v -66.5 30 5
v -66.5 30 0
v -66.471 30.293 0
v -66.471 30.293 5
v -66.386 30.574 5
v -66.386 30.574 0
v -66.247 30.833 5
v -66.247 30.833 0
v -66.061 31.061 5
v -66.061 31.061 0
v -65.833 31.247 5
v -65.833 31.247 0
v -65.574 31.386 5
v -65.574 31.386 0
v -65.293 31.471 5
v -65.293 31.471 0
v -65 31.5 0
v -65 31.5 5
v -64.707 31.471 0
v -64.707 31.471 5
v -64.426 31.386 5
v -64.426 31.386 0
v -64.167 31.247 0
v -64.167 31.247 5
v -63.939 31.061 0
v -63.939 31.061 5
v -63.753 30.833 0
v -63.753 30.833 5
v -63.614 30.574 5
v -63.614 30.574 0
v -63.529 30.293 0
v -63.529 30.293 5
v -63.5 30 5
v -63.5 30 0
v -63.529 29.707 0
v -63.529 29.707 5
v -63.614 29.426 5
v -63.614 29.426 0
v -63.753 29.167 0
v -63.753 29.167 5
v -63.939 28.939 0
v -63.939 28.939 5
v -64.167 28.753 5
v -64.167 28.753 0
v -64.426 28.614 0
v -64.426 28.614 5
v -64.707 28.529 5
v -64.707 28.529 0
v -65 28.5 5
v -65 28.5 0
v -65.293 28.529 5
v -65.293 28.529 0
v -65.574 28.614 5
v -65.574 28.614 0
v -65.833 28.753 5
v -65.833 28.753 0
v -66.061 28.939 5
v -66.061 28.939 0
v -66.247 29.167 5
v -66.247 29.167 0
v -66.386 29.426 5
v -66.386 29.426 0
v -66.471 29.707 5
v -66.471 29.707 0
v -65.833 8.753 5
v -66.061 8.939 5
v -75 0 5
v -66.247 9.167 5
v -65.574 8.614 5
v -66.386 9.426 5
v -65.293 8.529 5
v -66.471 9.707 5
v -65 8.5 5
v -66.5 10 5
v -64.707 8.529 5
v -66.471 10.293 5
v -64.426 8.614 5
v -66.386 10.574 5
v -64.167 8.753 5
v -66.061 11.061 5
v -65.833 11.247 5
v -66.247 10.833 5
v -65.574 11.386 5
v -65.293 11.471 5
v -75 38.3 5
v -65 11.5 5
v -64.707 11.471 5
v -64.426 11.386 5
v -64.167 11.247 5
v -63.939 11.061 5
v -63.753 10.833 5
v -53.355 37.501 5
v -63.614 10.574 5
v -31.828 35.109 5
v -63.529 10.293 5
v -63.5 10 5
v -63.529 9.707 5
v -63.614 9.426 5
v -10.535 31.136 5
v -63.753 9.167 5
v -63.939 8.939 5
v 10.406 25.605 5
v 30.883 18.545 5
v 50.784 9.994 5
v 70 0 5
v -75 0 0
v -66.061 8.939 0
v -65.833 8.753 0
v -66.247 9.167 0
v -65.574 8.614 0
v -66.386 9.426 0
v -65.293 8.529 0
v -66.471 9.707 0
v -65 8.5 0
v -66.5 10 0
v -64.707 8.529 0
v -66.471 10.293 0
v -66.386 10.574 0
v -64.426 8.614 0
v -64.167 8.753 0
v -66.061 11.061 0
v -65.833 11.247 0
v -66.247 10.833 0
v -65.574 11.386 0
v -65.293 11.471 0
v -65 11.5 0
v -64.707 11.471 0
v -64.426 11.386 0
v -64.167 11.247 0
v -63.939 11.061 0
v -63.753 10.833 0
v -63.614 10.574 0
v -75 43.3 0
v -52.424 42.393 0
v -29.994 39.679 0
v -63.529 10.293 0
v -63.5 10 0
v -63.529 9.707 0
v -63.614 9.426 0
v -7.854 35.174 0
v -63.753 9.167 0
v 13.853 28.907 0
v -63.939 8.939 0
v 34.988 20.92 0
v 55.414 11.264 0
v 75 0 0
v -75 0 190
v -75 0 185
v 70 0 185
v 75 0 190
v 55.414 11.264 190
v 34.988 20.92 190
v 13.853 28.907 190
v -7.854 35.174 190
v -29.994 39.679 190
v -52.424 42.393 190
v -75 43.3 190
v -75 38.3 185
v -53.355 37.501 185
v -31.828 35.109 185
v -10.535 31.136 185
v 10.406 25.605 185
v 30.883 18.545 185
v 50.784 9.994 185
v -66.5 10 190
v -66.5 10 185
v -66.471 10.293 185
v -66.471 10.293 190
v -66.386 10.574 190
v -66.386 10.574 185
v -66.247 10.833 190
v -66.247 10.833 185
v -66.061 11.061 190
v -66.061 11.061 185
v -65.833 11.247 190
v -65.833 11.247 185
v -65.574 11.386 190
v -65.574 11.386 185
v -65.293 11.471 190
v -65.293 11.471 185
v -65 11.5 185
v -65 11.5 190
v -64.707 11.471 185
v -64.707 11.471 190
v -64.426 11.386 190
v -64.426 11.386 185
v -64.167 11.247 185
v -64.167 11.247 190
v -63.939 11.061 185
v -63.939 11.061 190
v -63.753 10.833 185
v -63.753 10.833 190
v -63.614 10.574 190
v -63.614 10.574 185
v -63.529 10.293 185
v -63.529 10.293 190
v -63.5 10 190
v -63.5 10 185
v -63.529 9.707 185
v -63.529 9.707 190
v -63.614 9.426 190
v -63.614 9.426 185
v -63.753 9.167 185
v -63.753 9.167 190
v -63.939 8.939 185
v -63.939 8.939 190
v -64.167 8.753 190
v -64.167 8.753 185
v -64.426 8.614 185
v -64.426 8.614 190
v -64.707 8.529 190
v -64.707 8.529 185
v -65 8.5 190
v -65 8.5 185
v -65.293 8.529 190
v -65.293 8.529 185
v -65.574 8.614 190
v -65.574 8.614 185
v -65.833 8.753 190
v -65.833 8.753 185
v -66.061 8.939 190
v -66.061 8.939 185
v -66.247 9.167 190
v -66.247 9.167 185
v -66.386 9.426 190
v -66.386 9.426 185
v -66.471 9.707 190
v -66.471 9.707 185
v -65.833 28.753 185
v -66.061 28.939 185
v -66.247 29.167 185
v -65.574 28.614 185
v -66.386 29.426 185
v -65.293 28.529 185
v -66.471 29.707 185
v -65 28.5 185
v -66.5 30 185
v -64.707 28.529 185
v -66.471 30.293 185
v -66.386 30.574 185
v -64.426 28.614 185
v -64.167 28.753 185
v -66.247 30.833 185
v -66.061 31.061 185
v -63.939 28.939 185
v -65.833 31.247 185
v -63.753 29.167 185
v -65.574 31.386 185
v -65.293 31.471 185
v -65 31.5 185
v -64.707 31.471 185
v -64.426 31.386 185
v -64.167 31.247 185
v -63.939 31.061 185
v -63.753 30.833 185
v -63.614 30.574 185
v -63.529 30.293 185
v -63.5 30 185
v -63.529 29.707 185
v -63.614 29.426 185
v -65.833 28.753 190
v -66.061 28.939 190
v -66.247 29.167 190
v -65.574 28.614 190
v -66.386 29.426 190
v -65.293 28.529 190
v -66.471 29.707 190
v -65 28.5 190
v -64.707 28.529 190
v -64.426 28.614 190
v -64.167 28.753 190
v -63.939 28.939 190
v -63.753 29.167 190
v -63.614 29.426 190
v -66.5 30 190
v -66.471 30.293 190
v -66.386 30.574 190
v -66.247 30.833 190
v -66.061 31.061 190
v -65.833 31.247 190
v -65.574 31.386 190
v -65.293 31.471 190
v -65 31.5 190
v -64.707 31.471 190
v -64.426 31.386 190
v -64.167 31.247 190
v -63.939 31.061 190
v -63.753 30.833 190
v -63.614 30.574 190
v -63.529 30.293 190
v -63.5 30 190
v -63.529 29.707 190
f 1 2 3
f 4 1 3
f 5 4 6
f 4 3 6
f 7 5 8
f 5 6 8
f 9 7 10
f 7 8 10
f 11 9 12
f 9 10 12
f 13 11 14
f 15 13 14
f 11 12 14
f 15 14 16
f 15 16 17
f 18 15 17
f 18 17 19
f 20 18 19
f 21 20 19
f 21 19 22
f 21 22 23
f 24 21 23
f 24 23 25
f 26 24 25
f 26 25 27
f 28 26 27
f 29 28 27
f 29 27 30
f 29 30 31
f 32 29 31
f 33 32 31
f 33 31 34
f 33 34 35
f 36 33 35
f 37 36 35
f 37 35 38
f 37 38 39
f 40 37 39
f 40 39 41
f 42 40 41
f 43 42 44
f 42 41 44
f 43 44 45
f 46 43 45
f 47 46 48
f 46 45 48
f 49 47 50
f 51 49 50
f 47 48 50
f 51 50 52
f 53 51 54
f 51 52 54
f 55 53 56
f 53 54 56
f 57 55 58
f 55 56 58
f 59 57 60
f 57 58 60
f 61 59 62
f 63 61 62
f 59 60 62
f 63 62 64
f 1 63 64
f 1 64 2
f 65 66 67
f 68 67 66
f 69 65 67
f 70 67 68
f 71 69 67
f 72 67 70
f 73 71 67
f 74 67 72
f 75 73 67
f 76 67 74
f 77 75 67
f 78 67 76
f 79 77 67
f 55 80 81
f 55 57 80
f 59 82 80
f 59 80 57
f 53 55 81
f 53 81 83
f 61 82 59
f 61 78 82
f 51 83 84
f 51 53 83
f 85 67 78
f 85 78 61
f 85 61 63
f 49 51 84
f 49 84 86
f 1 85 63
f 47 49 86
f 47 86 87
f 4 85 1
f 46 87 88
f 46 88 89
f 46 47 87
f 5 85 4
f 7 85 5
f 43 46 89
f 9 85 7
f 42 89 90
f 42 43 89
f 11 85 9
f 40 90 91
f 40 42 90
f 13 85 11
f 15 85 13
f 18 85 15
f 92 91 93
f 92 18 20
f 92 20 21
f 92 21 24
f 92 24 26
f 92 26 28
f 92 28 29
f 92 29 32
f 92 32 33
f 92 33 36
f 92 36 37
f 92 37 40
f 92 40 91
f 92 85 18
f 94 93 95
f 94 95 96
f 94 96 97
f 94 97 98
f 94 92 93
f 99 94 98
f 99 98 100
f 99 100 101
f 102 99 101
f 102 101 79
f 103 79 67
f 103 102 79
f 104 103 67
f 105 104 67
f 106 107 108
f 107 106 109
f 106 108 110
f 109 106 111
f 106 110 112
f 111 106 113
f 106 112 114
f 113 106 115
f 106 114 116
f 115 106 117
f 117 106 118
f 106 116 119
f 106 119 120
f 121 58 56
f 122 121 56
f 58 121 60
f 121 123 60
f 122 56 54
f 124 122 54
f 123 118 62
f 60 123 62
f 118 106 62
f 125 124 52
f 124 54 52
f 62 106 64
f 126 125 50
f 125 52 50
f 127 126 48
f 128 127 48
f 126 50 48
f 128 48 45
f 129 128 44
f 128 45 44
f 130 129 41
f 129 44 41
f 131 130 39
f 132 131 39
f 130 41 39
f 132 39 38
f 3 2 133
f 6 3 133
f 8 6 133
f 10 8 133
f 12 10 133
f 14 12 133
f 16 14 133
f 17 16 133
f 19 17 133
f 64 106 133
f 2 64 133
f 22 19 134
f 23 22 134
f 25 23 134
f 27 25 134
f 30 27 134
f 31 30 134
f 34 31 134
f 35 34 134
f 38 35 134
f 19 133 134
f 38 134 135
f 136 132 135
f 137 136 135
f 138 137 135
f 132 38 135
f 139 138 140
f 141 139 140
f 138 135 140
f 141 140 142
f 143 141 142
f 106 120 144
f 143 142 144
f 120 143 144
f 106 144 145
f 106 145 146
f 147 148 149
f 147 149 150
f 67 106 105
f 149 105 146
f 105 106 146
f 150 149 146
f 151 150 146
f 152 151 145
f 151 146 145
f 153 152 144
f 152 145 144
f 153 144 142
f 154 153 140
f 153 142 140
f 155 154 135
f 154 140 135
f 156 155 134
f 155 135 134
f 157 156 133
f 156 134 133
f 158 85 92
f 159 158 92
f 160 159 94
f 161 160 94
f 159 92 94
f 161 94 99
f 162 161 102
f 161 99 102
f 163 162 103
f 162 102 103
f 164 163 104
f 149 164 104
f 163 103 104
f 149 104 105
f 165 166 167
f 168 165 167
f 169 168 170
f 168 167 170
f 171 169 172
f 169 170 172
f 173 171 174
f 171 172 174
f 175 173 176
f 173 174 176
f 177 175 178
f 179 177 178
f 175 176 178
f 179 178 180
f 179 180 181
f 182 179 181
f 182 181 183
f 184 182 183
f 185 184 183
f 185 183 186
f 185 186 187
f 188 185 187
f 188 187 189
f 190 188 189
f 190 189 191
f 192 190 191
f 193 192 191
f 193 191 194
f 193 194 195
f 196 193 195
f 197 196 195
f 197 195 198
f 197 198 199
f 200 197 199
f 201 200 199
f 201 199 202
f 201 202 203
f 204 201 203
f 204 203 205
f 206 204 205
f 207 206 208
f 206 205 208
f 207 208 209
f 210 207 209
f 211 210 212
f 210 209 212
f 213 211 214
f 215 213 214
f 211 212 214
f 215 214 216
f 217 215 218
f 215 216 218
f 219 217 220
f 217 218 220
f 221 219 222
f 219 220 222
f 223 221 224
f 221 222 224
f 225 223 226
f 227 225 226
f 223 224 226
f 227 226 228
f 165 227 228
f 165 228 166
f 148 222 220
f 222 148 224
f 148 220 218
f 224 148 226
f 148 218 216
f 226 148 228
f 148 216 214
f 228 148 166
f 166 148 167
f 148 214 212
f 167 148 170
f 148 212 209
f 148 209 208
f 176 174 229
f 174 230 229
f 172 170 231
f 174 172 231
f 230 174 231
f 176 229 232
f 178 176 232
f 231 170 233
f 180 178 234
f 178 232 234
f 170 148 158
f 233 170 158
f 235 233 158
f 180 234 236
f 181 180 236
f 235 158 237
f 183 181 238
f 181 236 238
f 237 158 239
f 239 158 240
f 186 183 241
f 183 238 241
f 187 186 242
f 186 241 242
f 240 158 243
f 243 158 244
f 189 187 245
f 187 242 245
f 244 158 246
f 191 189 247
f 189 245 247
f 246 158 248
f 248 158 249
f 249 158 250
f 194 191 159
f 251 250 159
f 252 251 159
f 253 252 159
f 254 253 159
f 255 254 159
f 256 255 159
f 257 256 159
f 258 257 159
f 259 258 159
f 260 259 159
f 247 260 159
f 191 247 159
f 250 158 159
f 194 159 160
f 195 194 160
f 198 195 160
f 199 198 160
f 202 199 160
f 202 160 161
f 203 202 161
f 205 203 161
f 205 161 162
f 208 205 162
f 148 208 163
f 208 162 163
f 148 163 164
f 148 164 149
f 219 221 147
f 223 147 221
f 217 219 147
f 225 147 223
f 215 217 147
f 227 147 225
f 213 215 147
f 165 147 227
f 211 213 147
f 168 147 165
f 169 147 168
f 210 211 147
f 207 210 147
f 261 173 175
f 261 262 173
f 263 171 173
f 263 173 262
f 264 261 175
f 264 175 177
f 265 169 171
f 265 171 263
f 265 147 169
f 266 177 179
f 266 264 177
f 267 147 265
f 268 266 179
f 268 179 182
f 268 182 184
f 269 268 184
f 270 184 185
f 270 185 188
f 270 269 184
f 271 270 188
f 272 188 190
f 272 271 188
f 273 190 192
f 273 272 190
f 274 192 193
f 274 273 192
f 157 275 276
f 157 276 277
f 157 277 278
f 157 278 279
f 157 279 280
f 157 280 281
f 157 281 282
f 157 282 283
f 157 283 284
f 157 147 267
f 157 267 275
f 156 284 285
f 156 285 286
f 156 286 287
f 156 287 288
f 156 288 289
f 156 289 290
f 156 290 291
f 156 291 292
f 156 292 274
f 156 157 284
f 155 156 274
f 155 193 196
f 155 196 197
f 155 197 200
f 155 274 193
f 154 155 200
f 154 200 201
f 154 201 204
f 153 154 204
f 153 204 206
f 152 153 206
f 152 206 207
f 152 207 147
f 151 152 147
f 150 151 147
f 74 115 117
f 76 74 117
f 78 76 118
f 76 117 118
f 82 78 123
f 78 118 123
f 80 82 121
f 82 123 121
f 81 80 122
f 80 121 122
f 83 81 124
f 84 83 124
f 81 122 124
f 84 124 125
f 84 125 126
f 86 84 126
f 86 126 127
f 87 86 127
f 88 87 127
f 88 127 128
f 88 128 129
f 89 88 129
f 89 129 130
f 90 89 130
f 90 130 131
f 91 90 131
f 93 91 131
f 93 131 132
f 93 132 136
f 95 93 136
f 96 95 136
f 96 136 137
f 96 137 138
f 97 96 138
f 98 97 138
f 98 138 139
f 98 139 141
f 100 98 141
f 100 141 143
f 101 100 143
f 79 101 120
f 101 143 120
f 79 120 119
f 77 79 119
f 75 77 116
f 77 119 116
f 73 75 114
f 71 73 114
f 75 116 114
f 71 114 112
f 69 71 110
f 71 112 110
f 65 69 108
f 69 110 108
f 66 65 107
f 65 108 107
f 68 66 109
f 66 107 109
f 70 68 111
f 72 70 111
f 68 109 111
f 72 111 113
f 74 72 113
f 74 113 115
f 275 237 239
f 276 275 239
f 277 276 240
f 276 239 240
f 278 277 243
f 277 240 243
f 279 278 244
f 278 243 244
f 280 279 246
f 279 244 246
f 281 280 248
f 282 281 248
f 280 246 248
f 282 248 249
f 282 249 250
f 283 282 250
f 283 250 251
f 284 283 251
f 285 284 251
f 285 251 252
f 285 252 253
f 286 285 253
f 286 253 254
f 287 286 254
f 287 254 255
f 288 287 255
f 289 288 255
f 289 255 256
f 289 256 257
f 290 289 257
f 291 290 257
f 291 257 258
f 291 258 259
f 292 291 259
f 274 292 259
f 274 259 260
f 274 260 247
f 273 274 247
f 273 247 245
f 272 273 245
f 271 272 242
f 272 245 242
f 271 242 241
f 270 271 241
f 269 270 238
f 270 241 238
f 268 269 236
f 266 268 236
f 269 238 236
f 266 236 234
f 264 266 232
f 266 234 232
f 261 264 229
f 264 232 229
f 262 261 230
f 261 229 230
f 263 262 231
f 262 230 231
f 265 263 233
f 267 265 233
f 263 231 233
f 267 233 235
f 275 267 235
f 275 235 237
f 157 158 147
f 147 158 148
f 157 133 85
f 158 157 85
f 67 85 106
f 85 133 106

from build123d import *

# Parameters (mm, degrees)
F1_DEPTH = 5
F3_DEPTH = 180
F5_DEPTH = 5
F7_D     = 3
F7_DEPTH = 200
F7_TIP   = 0.9012909285


with BuildPart() as f1:
    # F0 (on Top) → F1 (new body)
    with BuildSketch(Plane.XY):
        with BuildLine():
            Line((-75, 0), (0, 0))
            Line((0, 0), (75, 0))
            ThreePointArc((75, 0), (3.0622988388, 32.2584255386), (-75, 43.3))
            Line((-75, 43.3), (-75, 0))
        make_face()
    extrude(amount=F1_DEPTH)

    # F2 (on face) → F3 (join)
    with BuildSketch(Plane.XY.offset(5)):
        with BuildLine():
            ThreePointArc((75, 0), (3.0622988388, 32.2584255386), (-75, 43.3))
            Line((-75, 43.3), (-75, 38.3))
            ThreePointArc((-75, 38.3), (-0.0135178849, 28.5635745872), (70, 0))
            Line((70, 0), (75, 0))
        make_face()
    extrude(amount=F3_DEPTH)

    # F4 (on face) → F5 (join)
    with BuildSketch(Plane.XY.offset(185)):
        with BuildLine():
            ThreePointArc((70, 0), (-0.0135178849, 28.5635745872), (-75, 38.3))
            Line((-75, 38.3), (-75, 0))
            Line((-75, 0), (70, 0))
        make_face()
        with BuildLine():
            Line((-75, 43.3), (-75, 38.3))
            ThreePointArc((-75, 38.3), (-0.0135178849, 28.5635745872), (70, 0))
            Line((70, 0), (75, 0))
            ThreePointArc((75, 0), (3.0622988388, 32.2584255386), (-75, 43.3))
        make_face()
    extrude(amount=F5_DEPTH)

    # F7
    with Locations(Plane.XY.offset(190)):
        with Locations((-65, 30), (-65, 10)):
            Hole(F7_D / 2, depth=F7_DEPTH)
            with Locations((0, 0, -(F7_DEPTH + F7_TIP / 2))):  # 118° drill point
                Cone(0, F7_D / 2, F7_TIP, mode=Mode.SUBTRACT)


solid = f1.part
